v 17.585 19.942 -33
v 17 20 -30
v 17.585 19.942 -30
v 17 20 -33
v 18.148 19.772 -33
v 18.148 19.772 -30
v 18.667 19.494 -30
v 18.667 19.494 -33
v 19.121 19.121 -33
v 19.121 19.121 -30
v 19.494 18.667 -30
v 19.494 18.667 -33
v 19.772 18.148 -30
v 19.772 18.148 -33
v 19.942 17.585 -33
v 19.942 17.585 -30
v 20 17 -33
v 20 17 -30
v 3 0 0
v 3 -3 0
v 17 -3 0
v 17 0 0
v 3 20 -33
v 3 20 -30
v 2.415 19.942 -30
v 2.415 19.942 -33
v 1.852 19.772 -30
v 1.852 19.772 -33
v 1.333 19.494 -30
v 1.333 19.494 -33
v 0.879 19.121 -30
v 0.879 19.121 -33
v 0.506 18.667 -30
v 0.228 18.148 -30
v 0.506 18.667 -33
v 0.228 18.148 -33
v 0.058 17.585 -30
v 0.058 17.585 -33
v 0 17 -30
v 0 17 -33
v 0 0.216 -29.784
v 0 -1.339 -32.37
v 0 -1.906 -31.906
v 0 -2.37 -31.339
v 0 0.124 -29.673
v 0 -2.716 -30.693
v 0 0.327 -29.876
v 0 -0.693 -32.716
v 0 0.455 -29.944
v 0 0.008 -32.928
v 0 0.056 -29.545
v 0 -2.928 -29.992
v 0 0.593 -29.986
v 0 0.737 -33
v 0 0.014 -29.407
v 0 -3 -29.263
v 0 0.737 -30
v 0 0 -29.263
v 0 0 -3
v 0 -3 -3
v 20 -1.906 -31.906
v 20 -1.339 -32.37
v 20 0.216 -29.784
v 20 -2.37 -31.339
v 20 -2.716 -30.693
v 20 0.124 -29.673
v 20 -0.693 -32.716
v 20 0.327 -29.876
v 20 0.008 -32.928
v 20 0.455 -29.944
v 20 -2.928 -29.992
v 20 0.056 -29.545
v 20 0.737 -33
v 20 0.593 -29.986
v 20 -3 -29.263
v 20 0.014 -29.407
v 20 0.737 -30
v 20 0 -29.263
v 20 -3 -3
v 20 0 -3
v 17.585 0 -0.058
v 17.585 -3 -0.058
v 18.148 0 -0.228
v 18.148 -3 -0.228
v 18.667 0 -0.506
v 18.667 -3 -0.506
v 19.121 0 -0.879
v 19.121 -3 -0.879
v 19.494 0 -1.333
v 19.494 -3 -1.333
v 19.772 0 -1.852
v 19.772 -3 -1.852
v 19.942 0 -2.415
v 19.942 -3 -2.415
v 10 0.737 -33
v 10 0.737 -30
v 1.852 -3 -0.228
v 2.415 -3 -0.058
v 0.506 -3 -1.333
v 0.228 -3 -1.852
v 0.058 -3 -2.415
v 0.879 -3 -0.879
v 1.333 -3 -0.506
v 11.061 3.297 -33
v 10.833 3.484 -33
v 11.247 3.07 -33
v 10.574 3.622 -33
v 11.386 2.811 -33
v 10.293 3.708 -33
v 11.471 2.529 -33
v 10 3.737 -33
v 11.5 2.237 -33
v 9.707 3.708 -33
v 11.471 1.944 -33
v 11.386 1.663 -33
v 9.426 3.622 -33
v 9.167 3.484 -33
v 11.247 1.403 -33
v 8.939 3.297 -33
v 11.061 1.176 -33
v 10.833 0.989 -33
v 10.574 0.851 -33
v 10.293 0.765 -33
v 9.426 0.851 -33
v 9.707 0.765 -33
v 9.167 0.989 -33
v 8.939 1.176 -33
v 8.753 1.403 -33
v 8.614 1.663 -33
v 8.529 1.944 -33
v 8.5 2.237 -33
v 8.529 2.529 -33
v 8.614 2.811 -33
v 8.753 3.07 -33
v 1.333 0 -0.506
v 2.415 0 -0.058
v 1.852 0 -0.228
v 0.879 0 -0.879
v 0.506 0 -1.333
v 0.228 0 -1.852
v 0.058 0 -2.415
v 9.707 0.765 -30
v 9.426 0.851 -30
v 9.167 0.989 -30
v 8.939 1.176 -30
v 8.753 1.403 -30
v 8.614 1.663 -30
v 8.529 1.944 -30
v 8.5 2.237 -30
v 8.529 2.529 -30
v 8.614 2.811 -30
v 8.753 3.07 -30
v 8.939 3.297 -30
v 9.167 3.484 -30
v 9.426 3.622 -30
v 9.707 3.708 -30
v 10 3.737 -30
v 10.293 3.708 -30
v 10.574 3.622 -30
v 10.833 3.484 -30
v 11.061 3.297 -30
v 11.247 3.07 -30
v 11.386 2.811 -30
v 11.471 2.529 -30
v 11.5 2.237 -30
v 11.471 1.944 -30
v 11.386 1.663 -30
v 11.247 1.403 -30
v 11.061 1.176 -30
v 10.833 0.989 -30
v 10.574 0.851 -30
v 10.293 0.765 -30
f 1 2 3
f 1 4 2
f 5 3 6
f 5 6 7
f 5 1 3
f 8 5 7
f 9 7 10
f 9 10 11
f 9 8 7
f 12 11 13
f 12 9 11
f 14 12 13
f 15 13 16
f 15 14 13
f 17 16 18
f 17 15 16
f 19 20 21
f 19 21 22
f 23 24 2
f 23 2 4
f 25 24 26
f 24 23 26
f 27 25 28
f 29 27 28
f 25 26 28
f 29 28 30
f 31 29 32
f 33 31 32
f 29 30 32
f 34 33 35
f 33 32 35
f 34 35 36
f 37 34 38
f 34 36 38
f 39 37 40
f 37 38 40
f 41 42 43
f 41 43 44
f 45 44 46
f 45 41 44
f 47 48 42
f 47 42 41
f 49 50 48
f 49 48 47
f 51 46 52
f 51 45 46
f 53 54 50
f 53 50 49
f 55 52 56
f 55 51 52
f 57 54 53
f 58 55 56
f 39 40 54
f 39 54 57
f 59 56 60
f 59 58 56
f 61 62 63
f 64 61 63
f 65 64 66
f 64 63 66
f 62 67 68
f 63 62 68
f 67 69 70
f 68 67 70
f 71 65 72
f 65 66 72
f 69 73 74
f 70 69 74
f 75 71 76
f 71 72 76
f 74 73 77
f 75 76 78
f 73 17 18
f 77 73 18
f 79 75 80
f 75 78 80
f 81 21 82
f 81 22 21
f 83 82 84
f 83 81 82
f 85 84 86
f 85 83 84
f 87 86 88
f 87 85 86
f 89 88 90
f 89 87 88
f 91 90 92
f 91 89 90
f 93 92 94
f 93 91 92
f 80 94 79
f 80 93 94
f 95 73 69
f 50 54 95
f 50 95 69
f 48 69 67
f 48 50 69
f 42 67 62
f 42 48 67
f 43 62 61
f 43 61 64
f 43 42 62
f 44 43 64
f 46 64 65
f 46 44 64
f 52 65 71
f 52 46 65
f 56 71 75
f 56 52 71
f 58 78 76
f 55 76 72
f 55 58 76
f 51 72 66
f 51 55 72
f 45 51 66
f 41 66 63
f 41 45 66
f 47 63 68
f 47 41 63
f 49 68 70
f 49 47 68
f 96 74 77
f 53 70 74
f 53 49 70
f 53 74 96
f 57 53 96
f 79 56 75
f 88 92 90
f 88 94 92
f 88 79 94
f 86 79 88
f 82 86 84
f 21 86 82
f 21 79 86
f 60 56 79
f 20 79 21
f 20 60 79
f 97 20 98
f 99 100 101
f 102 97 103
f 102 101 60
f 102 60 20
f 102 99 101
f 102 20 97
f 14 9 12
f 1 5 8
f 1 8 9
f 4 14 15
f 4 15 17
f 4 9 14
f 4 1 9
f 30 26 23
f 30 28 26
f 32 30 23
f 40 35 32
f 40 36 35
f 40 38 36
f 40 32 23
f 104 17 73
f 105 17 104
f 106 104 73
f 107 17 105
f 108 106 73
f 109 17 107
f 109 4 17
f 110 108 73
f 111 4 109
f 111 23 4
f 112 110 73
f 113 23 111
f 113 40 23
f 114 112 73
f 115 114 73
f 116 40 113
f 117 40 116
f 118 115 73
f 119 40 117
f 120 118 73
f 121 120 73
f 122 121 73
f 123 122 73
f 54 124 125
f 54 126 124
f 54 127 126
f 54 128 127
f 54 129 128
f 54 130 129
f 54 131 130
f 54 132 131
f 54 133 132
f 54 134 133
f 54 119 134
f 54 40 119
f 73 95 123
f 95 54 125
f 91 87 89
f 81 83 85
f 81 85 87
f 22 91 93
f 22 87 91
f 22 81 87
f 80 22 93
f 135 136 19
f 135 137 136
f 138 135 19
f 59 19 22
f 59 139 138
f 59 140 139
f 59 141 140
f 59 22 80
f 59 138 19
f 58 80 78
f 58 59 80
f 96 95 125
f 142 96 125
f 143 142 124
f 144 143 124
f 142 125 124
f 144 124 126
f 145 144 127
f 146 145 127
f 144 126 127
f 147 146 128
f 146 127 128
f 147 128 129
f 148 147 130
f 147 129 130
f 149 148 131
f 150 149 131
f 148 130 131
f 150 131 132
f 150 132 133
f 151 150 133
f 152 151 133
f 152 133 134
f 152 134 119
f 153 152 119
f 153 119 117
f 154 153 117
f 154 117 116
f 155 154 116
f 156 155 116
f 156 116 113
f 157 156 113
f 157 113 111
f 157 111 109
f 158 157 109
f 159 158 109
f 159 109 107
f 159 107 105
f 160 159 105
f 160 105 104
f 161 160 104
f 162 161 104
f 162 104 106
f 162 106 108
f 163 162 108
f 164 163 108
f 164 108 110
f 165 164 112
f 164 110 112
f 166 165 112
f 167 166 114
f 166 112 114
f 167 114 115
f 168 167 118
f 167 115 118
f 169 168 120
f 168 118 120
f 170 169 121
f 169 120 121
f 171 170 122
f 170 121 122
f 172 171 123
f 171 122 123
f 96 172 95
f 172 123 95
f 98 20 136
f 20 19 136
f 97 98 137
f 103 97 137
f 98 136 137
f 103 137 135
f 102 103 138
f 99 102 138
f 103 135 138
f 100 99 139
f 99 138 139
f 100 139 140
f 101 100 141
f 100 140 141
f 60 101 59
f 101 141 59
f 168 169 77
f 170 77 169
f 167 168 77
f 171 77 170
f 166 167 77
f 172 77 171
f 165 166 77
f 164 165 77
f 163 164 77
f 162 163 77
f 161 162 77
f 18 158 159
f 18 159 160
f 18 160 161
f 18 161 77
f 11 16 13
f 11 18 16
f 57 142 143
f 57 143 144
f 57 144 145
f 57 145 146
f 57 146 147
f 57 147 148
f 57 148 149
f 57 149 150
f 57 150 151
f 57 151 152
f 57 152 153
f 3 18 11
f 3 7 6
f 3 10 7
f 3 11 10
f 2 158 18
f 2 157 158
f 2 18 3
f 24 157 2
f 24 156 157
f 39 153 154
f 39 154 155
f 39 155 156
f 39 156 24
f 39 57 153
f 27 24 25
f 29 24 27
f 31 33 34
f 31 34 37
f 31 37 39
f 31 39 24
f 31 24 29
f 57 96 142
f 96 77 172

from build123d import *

# Parameters (mm, degrees)
BASE_FLANGE1_DEPTH = 20
FILLET1_R          = 3
SKETCH5_R          = 1.5
CUT_EXTRUDE1_DEPTH = 44.462627624


# Sheet-metal steps are written as plain solids
with BuildPart() as part:
    # Sketch1 → Base-Flange1 (new body)
    with BuildSketch(Plane(origin=(0, 0, 0), x_dir=(0, 0, -1), z_dir=(1, 0, 0))):
        with BuildLine():
            Line((0, 0), (29.2634, 0))
            ThreePointArc((29.2634, 0), (29.784254855, 0.215745145), (30, 0.7366))
            Line((30, 0.7366), (30, 20))
            Line((30, 20), (33, 20))
            Line((33, 20), (33, 0.7366))
            ThreePointArc((33, 0.7366), (31.905575199, -1.905575199), (29.2634, -3))
            Line((29.2634, -3), (0, -3))
            Line((0, -3), (0, 0))
        make_face()
    extrude(amount=BASE_FLANGE1_DEPTH)

    # Fillet1
    fillet1_edges = [part.edges().sort_by_distance(p)[0] for p in [
        (20, -1.5, 0),
        (20, 20, -31.5),
        (0, -1.5, 0),
        (0, 20, -31.5),
    ]]
    fillet(fillet1_edges, radius=FILLET1_R)

    # Sketch5 → Cut-Extrude1 (cut, through all)
    with BuildSketch(Plane(origin=(0, 0, -33), x_dir=(-1, 0, 0), z_dir=(0, 0, -1))):
        with Locations(Location((-10, 2.2366, 0), (0, 0, 270))):
            Circle(SKETCH5_R)
    extrude(amount=-CUT_EXTRUDE1_DEPTH, mode=Mode.SUBTRACT)


solid = part.part
